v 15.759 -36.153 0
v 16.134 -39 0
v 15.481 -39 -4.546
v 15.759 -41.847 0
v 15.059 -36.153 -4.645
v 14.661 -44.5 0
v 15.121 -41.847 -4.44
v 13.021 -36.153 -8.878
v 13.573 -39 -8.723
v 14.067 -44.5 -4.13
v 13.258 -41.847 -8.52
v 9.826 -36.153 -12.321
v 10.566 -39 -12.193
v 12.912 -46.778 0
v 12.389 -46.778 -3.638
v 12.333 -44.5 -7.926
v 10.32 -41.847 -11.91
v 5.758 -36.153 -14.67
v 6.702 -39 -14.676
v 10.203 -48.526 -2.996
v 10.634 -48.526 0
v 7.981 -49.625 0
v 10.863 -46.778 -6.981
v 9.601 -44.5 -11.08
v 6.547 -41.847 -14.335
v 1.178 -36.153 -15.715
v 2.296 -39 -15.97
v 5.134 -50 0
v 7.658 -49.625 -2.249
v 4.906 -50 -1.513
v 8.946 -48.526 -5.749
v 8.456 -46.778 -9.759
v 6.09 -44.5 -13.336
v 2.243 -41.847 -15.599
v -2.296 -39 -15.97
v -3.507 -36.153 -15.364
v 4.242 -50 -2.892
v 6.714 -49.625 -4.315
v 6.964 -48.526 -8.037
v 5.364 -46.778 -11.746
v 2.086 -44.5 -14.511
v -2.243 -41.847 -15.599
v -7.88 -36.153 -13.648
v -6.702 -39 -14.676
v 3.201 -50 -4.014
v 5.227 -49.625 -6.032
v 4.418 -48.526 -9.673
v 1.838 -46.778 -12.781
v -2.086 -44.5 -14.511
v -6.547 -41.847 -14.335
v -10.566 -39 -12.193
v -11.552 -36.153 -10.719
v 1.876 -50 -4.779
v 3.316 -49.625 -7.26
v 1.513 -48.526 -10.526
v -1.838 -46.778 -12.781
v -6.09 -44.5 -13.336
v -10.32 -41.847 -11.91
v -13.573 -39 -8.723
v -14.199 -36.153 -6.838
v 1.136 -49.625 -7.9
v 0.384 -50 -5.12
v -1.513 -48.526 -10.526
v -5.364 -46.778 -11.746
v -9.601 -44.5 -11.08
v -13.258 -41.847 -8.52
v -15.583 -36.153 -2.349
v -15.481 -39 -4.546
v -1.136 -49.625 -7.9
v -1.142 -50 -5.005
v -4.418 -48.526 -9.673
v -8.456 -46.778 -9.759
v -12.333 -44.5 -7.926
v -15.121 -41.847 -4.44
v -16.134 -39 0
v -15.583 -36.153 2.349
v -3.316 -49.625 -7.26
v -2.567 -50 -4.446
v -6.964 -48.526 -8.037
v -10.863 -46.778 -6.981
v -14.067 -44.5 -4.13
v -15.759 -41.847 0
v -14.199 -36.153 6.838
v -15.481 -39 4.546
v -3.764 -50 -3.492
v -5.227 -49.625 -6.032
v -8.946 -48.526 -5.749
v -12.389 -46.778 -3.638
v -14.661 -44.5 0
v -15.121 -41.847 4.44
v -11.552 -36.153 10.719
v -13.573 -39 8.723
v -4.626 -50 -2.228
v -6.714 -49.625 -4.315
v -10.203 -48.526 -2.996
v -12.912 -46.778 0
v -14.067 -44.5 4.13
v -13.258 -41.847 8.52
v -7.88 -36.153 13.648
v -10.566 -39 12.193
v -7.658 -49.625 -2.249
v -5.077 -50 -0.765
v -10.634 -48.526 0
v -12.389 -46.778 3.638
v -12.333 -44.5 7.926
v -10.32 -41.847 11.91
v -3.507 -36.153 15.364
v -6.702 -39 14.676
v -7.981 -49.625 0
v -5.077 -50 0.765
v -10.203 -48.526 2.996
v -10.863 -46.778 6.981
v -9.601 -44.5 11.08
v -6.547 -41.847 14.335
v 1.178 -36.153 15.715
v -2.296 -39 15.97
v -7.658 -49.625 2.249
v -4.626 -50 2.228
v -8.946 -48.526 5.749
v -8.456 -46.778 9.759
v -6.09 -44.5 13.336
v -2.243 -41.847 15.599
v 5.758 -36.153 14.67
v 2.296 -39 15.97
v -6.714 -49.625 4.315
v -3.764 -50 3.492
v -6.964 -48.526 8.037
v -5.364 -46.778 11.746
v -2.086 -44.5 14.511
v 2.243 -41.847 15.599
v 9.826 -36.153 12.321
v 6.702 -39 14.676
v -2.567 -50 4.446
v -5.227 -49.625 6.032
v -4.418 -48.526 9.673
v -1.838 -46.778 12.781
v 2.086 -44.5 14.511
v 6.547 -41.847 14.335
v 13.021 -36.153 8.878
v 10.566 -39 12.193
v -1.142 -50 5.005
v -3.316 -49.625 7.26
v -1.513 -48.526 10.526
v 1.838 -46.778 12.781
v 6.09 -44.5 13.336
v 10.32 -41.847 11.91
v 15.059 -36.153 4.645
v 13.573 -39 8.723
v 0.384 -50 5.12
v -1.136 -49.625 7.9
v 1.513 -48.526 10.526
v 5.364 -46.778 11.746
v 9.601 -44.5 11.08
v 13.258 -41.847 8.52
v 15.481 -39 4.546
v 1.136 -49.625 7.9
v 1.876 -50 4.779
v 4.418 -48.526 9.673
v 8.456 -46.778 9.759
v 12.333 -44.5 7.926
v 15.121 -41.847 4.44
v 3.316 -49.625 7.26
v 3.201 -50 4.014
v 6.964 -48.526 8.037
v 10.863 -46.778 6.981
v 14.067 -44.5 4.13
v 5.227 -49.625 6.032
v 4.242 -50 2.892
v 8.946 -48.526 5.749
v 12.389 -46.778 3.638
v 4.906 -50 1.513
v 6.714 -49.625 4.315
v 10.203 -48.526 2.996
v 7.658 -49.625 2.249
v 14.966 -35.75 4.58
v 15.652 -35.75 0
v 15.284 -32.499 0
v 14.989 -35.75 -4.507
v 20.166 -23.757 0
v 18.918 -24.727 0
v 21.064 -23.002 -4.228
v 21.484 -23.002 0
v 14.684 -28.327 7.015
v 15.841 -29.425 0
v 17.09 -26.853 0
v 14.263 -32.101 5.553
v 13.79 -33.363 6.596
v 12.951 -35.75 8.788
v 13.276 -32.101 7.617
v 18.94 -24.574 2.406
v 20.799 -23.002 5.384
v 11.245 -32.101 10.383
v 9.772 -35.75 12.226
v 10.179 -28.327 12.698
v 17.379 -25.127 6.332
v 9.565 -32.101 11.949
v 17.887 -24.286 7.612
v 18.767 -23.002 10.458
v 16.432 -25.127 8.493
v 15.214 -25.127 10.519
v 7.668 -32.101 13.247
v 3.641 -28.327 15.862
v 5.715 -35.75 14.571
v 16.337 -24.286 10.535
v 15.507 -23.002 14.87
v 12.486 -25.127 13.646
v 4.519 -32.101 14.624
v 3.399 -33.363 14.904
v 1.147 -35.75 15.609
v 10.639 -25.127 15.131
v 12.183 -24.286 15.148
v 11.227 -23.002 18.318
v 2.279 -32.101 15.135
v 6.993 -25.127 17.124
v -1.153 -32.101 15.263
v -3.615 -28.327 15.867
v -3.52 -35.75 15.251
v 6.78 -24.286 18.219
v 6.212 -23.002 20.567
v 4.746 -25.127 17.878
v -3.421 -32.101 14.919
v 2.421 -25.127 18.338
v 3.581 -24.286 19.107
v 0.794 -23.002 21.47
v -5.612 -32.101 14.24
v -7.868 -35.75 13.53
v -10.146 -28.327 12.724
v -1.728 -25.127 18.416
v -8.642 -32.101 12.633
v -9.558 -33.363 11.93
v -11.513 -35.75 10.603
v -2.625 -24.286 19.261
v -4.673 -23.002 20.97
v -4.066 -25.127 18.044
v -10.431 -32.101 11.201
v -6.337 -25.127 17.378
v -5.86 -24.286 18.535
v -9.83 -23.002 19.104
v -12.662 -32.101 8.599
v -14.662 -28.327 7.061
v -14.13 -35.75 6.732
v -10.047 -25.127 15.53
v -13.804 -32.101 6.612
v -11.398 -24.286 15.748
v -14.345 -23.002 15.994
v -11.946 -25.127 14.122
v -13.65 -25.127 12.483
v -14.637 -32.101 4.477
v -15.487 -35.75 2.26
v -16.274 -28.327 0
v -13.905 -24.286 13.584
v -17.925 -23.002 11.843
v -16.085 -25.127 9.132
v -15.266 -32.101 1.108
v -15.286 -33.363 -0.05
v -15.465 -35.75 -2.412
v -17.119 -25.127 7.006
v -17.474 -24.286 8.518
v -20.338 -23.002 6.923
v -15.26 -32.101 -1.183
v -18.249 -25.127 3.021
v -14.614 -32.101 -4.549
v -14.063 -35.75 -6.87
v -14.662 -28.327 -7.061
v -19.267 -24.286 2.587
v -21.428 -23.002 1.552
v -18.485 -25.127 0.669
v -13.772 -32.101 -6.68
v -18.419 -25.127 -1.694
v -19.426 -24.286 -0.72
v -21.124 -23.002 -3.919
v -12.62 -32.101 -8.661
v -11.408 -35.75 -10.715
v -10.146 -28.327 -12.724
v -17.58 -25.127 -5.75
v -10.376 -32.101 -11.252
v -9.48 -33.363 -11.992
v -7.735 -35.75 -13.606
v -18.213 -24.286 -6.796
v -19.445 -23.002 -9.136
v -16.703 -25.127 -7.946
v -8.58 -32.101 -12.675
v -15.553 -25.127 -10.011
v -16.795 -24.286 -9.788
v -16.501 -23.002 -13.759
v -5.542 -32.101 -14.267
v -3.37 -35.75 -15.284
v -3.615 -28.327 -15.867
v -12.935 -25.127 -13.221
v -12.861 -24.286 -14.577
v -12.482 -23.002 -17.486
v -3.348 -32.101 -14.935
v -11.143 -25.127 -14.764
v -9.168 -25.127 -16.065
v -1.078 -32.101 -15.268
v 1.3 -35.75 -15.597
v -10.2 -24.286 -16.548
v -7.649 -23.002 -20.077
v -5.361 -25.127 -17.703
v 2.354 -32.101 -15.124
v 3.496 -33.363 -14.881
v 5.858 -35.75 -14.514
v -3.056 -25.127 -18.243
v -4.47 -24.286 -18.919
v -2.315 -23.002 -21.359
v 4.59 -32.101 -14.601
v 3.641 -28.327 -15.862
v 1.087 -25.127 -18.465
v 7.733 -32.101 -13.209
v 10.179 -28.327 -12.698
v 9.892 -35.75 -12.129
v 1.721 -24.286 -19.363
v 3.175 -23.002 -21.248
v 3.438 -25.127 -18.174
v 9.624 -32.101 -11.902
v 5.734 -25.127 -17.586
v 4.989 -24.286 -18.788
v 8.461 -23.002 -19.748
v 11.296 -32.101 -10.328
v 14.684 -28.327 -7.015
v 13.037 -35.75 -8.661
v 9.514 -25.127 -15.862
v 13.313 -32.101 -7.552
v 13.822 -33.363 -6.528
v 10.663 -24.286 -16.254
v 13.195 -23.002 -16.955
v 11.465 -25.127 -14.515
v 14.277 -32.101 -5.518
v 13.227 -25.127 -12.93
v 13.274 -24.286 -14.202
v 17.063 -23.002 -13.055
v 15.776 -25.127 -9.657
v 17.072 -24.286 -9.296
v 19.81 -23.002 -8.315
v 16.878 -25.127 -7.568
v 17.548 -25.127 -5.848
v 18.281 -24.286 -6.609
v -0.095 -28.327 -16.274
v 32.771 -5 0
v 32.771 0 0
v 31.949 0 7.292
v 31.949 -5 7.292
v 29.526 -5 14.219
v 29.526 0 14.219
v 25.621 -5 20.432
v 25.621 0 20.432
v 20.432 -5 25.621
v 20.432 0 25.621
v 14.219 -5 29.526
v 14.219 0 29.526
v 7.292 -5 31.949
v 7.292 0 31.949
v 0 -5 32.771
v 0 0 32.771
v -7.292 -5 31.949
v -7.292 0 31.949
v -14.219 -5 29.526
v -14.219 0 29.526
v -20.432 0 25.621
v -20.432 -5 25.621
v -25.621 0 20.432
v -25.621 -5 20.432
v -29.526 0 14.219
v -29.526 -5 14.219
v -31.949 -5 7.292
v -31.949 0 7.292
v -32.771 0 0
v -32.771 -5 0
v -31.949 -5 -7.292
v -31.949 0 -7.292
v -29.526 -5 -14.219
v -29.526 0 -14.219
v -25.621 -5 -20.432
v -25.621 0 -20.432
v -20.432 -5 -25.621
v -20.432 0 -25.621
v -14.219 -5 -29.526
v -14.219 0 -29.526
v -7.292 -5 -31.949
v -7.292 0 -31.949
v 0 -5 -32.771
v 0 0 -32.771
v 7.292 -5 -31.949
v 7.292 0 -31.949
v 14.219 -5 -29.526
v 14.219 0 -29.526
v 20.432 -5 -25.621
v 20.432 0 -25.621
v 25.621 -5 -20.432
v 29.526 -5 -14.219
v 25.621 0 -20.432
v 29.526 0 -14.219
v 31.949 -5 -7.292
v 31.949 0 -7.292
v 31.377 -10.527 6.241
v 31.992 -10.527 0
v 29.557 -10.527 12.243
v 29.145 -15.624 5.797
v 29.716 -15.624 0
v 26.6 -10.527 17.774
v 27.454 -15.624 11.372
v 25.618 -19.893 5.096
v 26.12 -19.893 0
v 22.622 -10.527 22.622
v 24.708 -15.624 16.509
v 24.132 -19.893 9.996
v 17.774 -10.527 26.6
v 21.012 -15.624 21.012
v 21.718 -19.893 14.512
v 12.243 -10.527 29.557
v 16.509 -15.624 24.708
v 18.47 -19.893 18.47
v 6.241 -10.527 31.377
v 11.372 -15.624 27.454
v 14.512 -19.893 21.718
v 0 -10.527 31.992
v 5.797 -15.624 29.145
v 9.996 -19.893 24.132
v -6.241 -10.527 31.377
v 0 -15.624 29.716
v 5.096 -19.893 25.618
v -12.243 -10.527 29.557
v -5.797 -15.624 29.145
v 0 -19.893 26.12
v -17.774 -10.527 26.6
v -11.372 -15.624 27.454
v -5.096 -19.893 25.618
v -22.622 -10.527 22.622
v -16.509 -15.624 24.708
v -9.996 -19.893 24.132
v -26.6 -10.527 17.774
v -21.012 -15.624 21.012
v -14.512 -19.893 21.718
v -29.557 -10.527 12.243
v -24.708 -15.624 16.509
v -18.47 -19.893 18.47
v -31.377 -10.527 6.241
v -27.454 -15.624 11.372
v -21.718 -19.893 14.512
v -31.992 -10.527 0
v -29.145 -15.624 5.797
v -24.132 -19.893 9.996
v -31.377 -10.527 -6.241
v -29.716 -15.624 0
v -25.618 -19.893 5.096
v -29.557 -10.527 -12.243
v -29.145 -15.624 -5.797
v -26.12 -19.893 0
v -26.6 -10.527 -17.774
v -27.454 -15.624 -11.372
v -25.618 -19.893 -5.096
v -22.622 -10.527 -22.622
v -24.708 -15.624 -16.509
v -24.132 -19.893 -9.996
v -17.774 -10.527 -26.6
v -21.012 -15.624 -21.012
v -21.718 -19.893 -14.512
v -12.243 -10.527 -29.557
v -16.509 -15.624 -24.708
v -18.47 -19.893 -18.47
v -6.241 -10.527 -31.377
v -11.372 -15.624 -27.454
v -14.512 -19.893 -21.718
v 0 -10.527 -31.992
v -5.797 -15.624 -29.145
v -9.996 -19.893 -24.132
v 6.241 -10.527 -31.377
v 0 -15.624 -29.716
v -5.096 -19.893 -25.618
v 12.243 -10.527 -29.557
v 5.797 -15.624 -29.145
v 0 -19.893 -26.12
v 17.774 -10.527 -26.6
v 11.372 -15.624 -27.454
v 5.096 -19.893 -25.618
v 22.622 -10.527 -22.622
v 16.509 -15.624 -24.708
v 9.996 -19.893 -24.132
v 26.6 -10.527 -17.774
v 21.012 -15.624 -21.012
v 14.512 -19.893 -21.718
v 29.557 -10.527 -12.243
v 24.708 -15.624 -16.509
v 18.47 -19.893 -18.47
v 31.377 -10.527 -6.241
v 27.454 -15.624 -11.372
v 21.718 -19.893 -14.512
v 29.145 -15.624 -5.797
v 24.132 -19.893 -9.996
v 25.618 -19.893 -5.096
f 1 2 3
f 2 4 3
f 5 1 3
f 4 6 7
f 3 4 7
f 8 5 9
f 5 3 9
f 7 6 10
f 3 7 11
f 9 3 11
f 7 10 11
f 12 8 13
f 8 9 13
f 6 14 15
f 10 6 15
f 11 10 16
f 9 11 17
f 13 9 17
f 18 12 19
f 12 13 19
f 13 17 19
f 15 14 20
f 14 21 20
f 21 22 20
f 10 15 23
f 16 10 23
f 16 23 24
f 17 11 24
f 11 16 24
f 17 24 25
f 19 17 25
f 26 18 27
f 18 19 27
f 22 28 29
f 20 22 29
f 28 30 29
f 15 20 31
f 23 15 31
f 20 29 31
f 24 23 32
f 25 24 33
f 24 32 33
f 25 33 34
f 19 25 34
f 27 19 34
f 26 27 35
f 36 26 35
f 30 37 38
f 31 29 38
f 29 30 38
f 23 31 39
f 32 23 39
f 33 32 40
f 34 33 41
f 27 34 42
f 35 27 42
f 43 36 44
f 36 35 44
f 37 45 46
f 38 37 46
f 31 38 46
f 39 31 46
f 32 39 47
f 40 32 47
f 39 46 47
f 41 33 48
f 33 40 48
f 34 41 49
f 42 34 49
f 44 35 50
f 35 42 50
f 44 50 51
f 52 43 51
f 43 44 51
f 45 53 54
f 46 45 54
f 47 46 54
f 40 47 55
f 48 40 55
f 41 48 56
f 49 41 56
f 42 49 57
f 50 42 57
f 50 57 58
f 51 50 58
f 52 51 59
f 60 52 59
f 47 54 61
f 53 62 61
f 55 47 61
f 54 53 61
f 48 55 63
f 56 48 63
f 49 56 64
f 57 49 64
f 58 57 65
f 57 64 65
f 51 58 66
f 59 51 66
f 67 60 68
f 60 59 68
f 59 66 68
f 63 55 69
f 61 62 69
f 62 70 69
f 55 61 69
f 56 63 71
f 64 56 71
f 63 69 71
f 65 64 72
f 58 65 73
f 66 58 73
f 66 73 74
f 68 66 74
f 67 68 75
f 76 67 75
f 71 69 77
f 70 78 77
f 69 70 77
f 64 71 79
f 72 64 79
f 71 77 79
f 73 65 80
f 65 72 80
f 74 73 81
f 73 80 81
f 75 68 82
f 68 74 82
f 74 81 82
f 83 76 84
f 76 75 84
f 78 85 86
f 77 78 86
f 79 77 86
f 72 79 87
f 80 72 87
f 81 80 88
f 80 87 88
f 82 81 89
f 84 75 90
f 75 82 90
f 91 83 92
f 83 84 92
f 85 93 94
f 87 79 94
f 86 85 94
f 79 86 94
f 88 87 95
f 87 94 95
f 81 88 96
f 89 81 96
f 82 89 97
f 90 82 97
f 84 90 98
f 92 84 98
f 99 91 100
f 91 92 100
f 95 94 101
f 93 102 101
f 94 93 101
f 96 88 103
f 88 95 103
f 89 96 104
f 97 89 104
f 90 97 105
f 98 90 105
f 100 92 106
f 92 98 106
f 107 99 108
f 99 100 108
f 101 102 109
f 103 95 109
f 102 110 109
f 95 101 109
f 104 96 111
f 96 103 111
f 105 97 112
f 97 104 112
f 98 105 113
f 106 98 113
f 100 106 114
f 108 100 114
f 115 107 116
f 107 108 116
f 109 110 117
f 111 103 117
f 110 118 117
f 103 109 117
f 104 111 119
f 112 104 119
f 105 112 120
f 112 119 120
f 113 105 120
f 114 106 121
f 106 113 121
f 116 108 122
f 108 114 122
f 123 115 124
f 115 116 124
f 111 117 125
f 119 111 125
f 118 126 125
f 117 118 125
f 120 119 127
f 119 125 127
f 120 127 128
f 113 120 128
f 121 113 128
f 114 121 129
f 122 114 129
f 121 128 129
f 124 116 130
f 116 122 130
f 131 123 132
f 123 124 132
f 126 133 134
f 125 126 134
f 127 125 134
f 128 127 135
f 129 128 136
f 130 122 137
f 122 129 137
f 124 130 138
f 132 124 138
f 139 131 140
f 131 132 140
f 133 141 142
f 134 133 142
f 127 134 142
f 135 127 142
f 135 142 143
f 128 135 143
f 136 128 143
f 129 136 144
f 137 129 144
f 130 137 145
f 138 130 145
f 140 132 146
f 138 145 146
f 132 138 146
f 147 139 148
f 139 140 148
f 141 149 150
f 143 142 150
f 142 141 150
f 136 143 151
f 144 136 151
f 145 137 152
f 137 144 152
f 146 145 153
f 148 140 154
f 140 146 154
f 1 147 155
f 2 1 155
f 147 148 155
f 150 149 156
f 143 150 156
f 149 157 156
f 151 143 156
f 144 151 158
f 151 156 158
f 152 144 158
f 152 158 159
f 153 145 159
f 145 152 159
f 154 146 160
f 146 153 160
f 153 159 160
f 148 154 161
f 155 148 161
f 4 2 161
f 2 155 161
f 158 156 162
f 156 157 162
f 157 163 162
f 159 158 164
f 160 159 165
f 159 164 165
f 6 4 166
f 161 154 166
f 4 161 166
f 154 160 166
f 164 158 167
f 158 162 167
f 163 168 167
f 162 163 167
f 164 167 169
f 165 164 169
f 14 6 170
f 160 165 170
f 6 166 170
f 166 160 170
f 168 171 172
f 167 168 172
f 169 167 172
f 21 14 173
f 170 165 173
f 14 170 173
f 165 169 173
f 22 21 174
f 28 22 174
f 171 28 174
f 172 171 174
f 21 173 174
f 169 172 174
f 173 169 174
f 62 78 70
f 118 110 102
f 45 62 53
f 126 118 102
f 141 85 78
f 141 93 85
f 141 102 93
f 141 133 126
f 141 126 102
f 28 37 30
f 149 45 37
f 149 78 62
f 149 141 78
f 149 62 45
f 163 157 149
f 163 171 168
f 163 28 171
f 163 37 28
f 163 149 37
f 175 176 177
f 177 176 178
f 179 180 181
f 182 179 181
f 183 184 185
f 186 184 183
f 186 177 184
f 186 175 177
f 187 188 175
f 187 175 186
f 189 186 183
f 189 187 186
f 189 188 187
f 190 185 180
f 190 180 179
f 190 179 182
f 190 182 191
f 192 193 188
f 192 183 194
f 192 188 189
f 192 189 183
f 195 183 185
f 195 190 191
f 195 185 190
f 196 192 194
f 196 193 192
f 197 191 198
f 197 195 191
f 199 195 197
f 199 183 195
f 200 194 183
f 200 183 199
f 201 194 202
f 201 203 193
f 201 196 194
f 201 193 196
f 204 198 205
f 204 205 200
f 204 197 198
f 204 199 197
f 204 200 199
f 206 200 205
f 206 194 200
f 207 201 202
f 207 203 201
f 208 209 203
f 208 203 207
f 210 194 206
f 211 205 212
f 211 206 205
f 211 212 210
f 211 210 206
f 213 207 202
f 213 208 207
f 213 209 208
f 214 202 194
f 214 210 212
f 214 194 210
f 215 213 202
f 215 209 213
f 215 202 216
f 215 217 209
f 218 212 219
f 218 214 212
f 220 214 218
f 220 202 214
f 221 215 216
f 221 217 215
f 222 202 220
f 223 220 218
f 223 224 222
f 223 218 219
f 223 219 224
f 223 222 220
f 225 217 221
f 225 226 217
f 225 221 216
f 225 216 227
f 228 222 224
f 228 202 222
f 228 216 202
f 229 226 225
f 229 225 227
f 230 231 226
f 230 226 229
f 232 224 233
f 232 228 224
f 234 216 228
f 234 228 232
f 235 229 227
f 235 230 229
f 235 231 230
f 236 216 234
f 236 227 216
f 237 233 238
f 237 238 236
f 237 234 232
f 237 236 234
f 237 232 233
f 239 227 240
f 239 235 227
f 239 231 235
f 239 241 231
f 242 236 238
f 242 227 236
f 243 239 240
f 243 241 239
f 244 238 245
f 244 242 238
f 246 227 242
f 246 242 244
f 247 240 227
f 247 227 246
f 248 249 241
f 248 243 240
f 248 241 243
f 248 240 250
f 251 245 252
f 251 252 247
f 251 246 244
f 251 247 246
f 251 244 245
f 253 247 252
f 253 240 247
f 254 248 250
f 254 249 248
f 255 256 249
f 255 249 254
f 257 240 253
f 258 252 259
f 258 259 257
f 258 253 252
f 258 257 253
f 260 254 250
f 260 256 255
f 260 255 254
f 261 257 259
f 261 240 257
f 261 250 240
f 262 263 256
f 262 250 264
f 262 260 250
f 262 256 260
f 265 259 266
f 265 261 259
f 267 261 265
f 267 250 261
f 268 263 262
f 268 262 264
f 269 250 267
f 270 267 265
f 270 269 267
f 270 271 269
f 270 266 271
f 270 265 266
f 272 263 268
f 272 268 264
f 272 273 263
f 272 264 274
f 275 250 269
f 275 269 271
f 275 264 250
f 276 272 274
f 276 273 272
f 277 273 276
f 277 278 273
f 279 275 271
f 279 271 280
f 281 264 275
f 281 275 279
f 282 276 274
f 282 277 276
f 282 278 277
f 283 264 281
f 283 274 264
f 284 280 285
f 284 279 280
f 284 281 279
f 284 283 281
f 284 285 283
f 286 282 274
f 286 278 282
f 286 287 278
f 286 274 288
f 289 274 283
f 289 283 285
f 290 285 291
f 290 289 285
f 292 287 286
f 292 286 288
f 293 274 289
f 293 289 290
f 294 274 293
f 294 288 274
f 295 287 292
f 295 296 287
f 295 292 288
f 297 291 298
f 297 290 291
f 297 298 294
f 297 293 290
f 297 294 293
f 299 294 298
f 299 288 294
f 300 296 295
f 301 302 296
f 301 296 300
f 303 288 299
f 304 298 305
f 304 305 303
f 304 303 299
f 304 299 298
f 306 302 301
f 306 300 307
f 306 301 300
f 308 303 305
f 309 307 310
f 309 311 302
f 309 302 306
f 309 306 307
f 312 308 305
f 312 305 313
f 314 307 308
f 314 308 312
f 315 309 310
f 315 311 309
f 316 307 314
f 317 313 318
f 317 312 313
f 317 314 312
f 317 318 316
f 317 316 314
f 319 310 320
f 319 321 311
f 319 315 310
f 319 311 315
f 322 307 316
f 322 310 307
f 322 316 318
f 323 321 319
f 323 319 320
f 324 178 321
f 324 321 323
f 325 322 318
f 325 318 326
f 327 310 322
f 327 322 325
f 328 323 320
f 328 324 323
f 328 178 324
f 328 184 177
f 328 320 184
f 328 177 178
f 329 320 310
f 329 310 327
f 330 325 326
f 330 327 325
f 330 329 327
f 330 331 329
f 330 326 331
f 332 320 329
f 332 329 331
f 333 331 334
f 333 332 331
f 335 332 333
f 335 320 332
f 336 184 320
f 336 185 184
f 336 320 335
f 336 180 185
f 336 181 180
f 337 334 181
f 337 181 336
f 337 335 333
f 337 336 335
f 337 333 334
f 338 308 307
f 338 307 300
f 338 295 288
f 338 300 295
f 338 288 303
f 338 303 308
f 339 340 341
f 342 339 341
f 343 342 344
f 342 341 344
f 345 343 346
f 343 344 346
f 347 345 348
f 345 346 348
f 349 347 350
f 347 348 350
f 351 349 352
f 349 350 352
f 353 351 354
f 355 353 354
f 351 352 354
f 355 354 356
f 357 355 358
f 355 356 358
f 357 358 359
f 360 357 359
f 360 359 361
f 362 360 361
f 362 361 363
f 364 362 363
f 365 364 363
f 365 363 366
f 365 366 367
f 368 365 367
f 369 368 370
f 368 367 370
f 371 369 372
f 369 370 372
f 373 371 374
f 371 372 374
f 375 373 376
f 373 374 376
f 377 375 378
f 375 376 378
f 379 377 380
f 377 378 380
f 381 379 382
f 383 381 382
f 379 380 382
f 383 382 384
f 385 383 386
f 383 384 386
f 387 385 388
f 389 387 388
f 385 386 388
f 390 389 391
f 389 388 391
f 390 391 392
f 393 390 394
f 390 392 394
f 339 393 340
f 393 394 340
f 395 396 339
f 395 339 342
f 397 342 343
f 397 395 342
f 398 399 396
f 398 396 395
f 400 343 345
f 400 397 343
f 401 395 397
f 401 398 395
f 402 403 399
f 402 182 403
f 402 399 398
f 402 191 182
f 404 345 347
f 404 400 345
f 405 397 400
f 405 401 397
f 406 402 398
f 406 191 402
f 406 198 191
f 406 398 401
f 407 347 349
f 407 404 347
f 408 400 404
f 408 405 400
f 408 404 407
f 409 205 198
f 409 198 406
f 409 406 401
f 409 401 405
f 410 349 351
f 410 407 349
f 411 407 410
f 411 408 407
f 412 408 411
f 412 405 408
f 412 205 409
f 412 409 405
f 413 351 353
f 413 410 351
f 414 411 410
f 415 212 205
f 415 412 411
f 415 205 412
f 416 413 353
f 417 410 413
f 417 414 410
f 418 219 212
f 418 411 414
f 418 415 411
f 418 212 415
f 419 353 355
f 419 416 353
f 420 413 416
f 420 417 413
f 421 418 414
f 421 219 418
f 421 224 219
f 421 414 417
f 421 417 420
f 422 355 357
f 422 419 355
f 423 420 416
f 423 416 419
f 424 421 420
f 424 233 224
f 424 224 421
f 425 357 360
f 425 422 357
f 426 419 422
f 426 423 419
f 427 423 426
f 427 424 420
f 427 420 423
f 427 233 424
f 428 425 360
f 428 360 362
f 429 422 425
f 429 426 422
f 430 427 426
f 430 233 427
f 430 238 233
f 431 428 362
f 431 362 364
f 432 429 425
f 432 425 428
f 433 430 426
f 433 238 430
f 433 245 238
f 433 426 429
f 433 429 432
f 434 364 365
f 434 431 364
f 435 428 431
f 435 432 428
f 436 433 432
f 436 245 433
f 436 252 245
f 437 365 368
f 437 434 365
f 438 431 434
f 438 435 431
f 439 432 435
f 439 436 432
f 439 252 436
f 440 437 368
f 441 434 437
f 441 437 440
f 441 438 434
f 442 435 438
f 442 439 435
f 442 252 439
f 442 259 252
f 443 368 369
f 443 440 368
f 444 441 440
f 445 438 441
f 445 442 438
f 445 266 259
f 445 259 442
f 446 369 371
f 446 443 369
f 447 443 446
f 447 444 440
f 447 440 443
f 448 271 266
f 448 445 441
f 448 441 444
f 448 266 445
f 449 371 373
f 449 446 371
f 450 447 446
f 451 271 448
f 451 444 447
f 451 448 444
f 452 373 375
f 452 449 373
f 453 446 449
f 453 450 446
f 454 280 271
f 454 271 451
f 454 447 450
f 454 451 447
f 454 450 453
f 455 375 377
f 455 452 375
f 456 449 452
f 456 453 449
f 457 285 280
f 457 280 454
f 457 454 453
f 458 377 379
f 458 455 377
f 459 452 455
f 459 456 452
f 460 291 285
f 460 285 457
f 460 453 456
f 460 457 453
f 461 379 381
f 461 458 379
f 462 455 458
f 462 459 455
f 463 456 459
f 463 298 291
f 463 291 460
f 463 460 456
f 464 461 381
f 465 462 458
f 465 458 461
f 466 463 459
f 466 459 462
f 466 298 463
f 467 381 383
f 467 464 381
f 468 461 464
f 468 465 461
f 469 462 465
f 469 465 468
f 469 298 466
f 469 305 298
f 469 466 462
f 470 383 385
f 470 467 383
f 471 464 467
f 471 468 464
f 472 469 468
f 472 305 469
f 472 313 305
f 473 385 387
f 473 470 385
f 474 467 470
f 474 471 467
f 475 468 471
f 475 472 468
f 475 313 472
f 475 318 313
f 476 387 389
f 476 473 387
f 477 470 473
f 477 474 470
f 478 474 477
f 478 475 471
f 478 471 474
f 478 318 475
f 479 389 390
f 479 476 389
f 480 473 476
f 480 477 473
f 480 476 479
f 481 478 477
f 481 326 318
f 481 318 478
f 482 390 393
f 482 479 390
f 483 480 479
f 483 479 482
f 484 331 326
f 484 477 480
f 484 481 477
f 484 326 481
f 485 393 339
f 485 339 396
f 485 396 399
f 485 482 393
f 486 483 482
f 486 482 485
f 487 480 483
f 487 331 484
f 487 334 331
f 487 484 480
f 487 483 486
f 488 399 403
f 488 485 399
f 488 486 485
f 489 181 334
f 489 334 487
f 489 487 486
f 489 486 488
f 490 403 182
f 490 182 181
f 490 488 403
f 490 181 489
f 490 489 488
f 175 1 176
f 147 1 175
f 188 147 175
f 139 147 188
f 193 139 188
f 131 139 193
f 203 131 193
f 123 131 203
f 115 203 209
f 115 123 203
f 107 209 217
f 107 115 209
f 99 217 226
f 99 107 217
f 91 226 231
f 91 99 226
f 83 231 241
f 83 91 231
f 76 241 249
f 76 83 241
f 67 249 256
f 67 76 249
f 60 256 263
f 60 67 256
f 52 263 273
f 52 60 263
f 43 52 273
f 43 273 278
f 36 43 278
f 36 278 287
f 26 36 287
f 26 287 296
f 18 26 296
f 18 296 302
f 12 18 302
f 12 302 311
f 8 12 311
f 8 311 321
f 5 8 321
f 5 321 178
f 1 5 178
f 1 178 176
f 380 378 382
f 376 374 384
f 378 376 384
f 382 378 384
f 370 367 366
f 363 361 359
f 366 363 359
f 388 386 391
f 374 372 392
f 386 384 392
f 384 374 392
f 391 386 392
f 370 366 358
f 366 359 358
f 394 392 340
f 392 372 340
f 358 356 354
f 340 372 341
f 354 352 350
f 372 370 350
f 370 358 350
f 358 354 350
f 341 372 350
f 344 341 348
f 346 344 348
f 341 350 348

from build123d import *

# Parameters (mm, degrees)
F0_R      = 32.7709743637
F1_DEPTH  = 25
F2_R      = 20
F1_FACE_R = 12.7709743637
F3_DEPTH  = 25
F3_TAPER  = -15
F4_R      = 11


with BuildPart() as f1:
    # F0 (on Front) → F1 (new body)
    with BuildSketch(Plane.XZ):
        Circle(F0_R)
    extrude(amount=F1_DEPTH)

    # F2
    f2_edges = [f1.edges().sort_by_distance(p)[0] for p in [
        (-32.770974, -25, 0),
    ]]
    fillet(f2_edges, radius=F2_R)

    # F1_face (on face) → F3 (join)
    with BuildSketch(Plane.XZ.offset(25)):
        Circle(F1_FACE_R)
    extrude(amount=F3_DEPTH, taper=F3_TAPER)

    # F4
    f4_edges = [f1.edges().sort_by_distance(p)[0] for p in [
        (-19.469704, -50, 0),
        (-12.770974, -25, 0),
    ]]
    fillet(f4_edges, radius=F4_R)


solid = f1.part
